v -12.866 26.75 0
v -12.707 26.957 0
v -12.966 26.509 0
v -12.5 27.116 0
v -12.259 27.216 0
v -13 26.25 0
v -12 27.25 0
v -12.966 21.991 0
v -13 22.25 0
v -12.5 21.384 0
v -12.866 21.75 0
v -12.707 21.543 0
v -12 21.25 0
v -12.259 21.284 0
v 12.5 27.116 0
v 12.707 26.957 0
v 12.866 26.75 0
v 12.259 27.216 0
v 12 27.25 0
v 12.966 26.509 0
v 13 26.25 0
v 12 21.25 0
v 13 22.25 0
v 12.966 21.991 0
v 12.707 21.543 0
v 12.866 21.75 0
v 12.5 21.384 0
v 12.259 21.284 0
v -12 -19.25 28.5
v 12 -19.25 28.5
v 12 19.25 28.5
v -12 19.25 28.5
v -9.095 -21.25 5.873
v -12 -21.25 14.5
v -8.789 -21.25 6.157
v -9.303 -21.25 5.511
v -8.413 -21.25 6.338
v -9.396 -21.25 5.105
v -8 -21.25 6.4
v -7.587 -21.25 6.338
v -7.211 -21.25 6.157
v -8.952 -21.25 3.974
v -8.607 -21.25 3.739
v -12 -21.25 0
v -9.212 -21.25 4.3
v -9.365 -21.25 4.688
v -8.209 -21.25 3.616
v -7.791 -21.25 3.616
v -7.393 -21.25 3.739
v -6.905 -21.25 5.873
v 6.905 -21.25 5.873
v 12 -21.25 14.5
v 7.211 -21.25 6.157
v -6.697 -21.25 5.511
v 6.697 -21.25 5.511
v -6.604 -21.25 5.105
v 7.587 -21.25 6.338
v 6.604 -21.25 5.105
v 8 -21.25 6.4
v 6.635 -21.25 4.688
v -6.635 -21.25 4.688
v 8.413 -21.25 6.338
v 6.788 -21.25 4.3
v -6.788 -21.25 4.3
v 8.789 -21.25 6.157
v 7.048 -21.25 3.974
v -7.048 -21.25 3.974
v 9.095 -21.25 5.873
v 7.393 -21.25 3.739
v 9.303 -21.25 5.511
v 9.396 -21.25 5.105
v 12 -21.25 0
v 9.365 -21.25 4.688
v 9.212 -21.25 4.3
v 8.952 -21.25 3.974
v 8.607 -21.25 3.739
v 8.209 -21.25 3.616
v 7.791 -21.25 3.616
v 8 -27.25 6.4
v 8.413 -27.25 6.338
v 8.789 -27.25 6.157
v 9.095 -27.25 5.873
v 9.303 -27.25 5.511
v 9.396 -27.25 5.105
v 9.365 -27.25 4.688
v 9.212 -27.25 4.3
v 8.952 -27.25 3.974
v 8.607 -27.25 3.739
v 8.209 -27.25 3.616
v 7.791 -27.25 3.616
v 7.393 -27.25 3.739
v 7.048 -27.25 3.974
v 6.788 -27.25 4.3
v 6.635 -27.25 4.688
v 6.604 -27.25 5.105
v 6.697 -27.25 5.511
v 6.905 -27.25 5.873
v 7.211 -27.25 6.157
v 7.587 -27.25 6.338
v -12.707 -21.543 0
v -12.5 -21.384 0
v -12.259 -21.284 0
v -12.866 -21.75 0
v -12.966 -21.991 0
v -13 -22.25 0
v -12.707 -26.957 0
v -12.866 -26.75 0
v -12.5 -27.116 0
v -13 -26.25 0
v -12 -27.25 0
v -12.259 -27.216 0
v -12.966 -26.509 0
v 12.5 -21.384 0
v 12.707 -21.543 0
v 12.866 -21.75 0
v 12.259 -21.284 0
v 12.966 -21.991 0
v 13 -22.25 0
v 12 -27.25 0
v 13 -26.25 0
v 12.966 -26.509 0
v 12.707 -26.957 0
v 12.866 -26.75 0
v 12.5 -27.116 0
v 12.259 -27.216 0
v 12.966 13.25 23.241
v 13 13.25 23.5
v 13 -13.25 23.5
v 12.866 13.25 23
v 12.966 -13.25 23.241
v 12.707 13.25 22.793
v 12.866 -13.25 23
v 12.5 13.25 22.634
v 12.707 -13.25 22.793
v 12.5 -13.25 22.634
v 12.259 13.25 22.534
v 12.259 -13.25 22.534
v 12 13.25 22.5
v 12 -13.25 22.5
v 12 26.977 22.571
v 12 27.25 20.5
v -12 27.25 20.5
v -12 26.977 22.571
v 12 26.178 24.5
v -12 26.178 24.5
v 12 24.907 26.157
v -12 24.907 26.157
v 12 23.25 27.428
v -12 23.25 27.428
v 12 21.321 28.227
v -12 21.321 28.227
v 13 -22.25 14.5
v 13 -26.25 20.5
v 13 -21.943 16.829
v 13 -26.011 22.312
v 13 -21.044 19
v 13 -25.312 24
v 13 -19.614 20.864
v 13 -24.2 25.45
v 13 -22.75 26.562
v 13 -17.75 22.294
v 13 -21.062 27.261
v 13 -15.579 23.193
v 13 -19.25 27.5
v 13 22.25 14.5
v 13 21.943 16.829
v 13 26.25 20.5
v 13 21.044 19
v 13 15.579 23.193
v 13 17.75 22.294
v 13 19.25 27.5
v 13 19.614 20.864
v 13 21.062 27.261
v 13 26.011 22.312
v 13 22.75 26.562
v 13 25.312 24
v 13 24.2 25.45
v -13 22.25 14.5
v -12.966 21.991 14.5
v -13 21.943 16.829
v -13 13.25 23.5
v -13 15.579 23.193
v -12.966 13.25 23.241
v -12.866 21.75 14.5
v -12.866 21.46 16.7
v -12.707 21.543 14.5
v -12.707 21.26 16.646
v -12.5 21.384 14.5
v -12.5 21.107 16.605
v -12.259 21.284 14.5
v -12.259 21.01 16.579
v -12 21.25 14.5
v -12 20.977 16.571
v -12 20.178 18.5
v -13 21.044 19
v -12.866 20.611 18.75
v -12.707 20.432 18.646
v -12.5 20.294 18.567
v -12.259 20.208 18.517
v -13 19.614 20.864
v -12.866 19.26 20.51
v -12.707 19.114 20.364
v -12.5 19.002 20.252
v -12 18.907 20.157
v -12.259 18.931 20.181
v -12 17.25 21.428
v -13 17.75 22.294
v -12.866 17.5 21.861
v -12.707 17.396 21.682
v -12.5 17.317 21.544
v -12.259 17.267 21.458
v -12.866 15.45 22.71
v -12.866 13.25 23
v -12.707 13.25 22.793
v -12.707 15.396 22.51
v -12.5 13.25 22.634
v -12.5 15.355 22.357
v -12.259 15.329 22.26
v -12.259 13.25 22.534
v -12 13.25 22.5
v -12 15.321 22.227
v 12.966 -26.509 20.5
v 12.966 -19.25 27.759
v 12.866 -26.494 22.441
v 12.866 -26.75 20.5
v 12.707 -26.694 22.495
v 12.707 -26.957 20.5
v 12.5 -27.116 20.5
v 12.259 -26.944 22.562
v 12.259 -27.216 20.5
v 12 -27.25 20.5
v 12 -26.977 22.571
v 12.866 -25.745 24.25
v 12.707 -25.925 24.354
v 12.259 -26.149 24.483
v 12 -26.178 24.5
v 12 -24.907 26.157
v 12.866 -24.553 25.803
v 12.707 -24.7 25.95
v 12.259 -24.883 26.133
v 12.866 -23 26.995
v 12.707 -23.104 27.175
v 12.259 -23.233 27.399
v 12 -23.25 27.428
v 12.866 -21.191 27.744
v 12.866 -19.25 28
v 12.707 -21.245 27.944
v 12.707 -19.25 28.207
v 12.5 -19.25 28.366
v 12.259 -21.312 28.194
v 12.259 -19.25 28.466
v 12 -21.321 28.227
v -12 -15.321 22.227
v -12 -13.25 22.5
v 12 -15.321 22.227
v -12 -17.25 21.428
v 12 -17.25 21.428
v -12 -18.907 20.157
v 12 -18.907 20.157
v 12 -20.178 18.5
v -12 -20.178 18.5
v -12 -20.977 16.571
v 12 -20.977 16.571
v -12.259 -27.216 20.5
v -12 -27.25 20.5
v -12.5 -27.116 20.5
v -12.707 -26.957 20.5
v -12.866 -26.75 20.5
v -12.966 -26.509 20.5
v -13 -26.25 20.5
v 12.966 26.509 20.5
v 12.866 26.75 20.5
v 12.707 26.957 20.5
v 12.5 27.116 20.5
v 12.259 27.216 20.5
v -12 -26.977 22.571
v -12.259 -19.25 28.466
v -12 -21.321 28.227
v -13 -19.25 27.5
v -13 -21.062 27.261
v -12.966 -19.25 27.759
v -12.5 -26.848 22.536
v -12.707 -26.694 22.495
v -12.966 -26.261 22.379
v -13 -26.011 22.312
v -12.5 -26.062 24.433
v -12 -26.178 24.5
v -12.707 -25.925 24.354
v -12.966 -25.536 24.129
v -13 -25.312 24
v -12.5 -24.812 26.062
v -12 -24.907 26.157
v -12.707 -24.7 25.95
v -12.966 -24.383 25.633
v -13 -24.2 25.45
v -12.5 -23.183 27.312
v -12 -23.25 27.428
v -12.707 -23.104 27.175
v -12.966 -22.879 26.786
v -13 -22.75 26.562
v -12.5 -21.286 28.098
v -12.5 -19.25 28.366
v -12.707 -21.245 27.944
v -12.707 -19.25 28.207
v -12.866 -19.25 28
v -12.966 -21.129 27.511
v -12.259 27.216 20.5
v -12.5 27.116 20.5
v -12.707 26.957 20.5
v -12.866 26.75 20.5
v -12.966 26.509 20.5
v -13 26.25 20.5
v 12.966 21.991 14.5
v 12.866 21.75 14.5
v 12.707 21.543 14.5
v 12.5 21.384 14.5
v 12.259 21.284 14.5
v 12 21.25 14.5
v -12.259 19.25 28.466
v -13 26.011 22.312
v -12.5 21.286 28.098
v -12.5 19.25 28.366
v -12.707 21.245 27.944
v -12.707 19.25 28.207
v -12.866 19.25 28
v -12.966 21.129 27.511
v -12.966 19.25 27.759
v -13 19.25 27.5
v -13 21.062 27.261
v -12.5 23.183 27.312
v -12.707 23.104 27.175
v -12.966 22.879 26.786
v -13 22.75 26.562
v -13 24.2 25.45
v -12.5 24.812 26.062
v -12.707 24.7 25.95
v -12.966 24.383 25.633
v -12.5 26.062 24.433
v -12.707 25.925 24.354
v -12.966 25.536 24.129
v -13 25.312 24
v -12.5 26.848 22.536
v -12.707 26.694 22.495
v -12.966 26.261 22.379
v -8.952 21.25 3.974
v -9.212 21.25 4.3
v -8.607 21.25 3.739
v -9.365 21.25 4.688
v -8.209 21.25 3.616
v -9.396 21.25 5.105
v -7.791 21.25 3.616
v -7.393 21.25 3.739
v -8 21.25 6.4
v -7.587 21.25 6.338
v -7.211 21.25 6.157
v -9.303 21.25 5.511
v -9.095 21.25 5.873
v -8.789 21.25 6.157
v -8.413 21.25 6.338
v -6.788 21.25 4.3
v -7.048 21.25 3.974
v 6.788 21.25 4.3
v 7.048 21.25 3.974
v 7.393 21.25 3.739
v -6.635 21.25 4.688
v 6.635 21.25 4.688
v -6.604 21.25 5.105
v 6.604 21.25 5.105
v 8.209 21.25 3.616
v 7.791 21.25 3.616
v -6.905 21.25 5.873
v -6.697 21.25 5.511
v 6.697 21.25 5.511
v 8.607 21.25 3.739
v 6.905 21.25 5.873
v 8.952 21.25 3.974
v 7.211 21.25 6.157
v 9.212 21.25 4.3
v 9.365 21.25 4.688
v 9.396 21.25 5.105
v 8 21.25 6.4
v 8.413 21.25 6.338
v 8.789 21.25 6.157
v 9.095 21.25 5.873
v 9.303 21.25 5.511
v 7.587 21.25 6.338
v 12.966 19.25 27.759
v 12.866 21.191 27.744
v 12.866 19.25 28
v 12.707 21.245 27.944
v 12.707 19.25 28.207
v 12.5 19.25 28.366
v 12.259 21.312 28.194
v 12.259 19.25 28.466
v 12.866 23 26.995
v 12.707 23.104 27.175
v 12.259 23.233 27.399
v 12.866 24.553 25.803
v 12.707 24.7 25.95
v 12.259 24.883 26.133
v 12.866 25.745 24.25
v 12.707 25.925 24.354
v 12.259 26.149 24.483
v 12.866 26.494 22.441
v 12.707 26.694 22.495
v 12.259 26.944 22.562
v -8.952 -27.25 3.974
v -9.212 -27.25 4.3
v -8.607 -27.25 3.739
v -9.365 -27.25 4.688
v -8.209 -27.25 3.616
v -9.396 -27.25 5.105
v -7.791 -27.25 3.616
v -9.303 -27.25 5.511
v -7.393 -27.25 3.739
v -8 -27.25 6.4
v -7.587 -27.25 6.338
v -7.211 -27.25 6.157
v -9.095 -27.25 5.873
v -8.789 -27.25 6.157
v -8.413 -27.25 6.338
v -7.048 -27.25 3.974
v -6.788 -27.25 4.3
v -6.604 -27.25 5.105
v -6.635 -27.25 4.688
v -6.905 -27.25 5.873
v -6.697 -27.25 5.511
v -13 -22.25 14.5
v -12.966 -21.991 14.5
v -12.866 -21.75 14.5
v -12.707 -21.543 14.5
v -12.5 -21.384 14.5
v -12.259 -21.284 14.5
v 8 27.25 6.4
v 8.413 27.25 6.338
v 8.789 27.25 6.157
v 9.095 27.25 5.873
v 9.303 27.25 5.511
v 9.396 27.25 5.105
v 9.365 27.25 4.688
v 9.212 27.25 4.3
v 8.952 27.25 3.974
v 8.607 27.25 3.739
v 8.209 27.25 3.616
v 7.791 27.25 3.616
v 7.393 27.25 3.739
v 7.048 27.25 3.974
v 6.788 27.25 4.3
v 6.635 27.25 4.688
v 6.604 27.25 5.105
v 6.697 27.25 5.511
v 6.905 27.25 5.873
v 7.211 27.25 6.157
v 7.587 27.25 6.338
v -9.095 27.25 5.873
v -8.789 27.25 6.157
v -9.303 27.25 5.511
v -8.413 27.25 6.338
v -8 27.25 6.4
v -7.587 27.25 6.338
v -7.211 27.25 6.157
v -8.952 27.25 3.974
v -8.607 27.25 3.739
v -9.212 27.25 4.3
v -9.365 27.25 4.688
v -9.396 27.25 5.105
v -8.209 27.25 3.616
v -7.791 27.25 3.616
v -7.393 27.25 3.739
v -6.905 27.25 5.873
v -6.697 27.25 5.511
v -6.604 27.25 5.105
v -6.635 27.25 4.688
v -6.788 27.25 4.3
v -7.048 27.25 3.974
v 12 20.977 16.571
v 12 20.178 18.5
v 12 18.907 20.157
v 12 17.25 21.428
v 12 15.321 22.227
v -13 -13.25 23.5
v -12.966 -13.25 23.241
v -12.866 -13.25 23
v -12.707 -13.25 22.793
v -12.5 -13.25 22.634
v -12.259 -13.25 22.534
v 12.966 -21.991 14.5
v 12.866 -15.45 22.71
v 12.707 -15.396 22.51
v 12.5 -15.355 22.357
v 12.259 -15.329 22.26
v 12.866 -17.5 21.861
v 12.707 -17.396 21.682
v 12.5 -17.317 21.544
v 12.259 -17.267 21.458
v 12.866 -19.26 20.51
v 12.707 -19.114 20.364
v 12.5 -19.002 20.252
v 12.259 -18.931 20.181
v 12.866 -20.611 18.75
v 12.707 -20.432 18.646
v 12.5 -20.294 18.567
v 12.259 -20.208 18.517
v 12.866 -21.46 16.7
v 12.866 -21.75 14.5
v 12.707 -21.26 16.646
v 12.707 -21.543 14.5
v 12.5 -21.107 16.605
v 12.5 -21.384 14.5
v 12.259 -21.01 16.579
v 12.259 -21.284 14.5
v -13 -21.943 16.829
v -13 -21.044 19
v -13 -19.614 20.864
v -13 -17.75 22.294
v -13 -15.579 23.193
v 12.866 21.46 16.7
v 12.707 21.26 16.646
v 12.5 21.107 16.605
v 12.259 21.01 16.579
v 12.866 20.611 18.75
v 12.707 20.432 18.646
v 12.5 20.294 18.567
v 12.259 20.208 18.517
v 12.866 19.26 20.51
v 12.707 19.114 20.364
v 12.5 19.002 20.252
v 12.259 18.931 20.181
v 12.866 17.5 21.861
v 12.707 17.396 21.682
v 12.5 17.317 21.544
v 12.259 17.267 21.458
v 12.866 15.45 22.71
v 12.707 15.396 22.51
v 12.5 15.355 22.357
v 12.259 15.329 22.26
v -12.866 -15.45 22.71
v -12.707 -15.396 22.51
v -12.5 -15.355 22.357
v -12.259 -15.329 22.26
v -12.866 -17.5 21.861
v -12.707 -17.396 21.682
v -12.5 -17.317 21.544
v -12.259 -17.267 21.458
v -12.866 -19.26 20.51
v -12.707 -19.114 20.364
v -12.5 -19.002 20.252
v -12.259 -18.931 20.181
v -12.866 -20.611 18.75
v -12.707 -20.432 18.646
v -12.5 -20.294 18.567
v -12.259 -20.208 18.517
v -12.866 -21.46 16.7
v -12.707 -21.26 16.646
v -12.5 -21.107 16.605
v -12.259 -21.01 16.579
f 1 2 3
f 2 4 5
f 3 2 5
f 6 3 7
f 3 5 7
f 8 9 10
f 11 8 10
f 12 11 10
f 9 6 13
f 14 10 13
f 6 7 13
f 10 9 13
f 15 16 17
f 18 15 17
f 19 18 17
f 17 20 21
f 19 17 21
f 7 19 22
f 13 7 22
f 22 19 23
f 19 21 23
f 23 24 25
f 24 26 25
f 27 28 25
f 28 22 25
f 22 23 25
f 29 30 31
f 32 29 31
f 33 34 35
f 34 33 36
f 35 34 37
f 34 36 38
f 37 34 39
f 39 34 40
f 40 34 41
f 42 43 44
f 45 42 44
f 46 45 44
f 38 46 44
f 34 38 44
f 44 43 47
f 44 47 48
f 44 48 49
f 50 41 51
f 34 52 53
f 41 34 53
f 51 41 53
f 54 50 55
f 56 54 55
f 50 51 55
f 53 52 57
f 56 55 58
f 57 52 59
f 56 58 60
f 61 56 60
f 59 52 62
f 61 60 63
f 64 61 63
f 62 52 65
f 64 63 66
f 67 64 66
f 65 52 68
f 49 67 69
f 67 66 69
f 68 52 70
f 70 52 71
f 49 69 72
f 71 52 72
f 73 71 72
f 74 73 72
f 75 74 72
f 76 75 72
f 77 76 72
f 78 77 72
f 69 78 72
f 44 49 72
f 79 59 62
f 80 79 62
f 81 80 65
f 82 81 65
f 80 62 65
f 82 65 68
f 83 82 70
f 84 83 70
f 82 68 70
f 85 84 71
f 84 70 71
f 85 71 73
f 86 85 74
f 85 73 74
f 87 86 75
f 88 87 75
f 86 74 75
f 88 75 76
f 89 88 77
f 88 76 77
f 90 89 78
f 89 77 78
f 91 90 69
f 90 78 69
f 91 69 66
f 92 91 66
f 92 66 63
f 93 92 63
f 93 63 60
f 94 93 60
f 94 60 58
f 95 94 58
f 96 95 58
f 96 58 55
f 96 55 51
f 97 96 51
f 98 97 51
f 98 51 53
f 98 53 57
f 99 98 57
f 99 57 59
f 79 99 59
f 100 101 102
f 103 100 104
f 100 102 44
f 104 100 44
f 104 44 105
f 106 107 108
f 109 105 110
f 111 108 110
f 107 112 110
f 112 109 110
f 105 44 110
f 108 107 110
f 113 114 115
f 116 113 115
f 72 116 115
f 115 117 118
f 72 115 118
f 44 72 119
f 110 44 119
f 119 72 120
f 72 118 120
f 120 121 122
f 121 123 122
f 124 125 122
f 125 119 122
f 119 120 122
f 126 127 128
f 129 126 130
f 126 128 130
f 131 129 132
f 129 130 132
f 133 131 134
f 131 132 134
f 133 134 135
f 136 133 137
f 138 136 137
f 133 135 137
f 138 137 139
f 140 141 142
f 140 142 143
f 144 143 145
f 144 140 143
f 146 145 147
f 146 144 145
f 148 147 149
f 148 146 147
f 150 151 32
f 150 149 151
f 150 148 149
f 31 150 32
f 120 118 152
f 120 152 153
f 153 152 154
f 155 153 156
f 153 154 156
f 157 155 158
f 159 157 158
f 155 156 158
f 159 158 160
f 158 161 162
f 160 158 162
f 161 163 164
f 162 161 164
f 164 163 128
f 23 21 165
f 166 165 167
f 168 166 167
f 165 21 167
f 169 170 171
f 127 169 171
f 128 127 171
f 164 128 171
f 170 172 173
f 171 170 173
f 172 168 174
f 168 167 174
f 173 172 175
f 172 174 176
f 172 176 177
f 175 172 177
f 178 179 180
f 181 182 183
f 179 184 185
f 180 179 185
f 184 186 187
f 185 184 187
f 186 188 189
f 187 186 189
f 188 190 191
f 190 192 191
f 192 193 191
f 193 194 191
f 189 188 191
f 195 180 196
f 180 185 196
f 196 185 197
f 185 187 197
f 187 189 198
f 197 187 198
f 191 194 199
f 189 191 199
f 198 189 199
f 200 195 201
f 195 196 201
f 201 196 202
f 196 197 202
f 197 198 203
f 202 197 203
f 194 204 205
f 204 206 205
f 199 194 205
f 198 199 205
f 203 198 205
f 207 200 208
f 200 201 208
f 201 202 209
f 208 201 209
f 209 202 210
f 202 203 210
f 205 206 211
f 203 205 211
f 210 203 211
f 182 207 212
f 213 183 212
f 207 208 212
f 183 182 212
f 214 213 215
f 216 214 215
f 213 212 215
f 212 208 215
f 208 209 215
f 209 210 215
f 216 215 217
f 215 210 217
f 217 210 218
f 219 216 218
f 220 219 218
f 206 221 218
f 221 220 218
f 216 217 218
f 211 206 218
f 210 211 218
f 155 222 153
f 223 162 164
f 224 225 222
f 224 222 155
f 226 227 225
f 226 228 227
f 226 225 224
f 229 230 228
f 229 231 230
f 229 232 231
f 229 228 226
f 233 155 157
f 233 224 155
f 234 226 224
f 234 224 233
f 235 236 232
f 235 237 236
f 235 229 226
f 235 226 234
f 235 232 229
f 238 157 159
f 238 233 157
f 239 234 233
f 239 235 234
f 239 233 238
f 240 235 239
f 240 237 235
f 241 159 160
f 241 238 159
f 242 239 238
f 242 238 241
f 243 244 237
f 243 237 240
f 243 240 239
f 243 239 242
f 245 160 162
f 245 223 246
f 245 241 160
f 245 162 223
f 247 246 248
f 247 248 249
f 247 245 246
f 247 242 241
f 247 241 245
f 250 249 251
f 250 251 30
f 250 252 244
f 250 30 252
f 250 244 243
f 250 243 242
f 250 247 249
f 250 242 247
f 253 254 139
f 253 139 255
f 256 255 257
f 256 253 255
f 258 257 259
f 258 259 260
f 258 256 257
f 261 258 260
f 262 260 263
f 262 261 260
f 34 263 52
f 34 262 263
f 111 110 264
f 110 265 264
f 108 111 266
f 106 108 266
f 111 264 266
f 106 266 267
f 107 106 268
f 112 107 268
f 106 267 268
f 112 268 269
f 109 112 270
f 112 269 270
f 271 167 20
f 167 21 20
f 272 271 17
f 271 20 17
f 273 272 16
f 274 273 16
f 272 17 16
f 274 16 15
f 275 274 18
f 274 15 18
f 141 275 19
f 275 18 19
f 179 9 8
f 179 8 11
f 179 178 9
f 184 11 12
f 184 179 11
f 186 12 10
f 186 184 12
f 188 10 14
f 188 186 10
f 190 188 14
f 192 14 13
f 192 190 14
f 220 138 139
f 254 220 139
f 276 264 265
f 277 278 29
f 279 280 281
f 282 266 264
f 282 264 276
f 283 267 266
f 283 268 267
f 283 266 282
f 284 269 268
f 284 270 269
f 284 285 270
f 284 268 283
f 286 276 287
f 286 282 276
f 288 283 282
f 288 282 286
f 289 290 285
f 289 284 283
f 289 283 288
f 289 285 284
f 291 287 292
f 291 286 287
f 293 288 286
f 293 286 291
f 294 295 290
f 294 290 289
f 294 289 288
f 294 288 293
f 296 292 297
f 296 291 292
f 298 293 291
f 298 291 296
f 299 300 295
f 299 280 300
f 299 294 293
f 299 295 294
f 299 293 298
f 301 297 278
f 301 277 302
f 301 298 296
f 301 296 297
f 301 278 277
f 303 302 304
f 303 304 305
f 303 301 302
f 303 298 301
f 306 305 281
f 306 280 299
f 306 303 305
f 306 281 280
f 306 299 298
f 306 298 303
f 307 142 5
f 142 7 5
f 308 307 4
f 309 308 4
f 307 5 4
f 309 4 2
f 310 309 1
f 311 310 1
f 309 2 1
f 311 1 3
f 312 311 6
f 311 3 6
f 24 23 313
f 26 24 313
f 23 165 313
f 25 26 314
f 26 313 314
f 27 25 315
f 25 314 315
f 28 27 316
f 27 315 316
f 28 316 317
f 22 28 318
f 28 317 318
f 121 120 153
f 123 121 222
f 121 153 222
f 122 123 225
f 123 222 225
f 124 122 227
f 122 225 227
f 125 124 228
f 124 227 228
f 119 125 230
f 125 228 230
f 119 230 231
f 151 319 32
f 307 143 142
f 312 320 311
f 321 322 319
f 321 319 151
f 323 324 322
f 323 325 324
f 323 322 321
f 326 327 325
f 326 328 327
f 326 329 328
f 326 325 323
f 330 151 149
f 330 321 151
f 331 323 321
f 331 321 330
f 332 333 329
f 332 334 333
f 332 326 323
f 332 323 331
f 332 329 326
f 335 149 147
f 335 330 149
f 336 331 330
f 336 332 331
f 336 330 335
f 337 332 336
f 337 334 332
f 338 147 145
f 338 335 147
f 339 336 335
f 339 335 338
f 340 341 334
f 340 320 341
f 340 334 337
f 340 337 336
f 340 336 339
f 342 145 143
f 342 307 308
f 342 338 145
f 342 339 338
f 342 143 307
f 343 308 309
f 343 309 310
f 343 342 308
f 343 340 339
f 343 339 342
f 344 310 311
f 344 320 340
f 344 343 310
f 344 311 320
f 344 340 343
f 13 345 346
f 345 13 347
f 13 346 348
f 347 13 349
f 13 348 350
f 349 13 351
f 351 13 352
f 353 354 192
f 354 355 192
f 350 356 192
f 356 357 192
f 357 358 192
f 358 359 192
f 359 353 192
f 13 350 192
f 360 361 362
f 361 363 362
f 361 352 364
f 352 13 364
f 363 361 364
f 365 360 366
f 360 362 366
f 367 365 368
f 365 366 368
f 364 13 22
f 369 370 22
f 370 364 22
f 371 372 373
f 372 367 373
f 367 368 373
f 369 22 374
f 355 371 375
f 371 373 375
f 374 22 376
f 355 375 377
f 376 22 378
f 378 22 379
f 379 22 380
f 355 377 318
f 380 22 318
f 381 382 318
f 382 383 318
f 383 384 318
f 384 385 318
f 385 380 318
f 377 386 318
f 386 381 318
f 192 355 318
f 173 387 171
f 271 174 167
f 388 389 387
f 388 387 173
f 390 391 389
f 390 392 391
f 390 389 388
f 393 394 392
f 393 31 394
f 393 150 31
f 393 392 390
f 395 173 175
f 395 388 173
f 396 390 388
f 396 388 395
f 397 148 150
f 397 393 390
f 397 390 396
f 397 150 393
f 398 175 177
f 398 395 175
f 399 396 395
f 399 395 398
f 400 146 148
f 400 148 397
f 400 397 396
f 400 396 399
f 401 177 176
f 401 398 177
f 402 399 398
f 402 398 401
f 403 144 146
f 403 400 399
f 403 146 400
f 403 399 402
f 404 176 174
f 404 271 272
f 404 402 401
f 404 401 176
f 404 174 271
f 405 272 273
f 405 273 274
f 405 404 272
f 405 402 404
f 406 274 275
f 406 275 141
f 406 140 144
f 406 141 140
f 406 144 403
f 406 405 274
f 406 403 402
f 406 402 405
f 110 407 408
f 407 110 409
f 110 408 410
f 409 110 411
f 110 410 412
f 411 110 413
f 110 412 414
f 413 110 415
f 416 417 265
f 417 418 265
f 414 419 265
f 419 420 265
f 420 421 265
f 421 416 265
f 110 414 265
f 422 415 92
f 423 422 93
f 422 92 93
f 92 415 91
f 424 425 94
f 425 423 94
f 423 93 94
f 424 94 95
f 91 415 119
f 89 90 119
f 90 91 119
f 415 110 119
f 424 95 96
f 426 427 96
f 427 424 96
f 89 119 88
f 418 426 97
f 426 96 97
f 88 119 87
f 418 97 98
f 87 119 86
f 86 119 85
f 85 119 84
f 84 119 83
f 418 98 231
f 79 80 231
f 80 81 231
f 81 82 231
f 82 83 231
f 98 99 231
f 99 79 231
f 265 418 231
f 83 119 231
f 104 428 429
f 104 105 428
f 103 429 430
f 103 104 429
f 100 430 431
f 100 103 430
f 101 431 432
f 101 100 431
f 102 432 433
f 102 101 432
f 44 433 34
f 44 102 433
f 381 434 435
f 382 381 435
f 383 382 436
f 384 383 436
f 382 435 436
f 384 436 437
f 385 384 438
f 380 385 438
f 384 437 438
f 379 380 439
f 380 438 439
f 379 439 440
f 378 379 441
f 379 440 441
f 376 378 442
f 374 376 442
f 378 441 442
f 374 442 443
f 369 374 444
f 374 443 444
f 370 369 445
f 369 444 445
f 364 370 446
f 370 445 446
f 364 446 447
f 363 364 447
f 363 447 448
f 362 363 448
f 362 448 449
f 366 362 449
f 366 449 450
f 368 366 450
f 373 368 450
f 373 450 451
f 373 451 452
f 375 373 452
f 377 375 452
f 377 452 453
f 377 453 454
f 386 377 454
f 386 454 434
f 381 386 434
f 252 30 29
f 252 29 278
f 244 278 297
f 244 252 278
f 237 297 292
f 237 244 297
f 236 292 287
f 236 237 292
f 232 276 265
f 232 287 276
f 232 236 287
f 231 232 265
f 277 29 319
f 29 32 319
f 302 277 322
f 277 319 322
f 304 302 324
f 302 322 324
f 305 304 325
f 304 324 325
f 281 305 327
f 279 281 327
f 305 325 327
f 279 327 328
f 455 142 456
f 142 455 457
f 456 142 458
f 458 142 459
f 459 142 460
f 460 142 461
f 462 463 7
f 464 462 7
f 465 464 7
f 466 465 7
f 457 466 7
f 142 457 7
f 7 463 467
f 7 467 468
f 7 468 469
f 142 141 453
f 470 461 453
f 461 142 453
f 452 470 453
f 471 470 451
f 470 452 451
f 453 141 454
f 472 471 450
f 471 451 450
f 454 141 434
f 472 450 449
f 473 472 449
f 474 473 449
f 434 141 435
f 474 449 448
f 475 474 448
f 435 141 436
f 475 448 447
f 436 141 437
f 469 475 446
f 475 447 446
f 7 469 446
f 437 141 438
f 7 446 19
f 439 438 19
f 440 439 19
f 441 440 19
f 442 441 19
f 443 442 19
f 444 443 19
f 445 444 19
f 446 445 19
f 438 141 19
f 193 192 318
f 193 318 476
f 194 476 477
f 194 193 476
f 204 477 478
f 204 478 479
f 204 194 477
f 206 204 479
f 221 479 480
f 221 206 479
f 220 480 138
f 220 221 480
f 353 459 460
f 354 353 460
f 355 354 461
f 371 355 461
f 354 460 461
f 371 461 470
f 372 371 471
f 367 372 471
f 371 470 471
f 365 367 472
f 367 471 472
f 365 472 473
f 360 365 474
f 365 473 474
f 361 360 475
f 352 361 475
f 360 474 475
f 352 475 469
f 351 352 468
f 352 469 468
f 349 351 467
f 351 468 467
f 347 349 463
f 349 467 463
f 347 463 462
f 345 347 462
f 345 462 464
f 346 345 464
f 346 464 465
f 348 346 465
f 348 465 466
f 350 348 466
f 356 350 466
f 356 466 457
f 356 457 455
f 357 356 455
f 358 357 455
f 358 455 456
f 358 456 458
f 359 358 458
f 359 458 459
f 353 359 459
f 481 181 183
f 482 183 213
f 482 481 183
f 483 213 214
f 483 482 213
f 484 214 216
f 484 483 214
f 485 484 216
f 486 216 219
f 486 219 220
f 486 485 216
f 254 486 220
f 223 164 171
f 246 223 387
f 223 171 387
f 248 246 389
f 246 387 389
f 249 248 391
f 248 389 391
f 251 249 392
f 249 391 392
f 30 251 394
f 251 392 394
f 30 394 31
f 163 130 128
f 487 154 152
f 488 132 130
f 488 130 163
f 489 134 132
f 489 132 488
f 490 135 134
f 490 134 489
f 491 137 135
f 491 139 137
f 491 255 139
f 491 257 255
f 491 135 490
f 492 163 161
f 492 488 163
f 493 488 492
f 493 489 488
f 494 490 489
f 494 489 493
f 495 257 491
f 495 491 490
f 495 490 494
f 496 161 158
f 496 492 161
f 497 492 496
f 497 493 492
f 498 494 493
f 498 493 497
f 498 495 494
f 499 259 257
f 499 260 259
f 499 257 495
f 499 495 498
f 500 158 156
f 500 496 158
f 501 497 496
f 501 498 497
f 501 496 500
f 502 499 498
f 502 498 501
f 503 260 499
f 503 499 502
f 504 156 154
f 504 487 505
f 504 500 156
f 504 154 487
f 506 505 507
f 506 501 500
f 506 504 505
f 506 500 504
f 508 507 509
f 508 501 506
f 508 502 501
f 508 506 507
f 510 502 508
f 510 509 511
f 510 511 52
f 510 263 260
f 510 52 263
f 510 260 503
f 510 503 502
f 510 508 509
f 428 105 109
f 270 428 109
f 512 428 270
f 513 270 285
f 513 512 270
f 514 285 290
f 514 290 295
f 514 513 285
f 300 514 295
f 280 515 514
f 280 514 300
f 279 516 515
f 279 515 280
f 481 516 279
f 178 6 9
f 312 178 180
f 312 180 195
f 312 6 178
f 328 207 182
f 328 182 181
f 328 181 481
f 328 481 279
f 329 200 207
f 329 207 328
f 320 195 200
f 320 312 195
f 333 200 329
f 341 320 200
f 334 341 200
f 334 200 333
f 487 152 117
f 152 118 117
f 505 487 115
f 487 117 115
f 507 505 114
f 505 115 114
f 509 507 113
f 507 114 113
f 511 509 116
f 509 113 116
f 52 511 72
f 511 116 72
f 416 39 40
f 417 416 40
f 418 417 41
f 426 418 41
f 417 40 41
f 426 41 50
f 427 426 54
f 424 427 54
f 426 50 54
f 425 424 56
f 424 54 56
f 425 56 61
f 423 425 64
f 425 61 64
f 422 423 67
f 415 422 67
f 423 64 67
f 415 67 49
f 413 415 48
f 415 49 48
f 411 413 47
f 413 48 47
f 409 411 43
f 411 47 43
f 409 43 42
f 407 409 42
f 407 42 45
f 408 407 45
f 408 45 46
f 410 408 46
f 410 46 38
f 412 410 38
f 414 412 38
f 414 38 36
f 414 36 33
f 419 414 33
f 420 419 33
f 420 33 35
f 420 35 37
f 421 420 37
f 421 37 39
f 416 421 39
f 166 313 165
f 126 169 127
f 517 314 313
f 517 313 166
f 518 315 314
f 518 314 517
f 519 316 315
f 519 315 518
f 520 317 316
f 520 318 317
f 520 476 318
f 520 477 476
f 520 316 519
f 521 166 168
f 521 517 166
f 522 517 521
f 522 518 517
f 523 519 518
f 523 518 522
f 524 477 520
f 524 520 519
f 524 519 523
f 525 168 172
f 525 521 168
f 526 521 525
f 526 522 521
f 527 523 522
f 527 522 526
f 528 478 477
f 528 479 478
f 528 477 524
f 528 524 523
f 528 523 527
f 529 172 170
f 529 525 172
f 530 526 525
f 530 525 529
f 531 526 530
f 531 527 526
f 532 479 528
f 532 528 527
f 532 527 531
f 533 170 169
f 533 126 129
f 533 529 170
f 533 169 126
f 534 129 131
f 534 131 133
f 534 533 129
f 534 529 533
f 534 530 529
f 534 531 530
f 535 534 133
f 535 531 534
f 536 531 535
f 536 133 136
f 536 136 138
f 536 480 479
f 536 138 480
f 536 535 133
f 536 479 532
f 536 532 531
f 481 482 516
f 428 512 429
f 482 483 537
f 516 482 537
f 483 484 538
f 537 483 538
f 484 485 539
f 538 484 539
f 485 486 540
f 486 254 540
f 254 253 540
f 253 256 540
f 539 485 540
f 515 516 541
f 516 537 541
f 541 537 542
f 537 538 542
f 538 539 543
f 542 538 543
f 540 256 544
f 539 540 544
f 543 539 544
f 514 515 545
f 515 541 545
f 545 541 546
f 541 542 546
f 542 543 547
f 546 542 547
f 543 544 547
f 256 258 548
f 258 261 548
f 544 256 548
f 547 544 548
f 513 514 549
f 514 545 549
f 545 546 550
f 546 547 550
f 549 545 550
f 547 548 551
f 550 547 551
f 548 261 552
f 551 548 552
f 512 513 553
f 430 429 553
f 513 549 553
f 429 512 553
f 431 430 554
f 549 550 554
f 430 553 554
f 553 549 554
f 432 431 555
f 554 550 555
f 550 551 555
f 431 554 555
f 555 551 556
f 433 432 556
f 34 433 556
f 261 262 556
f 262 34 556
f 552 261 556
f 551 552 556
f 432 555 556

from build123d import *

# Parameters (mm, degrees)
BASE_DEPTH              = 13
SKETCH2_R               = 1.4
SCREW_HOLES_DEPTH       = 63.860957676
F_8MM_BRACKET_FILLETS_R = 8
F_1MM_EDGE_FILLETS_R    = 1


with BuildPart() as part:
    # Sketch1 → Base (new, symmetric)
    with BuildSketch(Plane(origin=(0, 0, 0), x_dir=(0, 0, -1), z_dir=(1, 0, 0))):
        Polygon((0, 27.25), (0, 21.25), (-22.5, 21.25), (-22.5, -21.25), (0, -21.25), (0, -27.25), (-28.5, -27.25), (-28.5, 27.25), align=None)
    extrude(amount=BASE_DEPTH, both=True)

    # Sketch2 → Screw Holes (cut, through all)
    with BuildSketch(Plane(origin=(0, 27.25, 0), x_dir=(1, 0, 0), z_dir=(0, 1, 0))):
        with Locations((-8, -5)):
            Circle(SKETCH2_R)
        with Locations((8, -5)):
            Circle(SKETCH2_R)
    extrude(amount=-SCREW_HOLES_DEPTH, mode=Mode.SUBTRACT)

    # 8mm Bracket Fillets
    f_8mm_bracket_fillets_edges = [part.edges().sort_by_distance(p)[0] for p in [
        (0, 21.25, 22.5),
        (0, 27.25, 28.5),
        (0, -27.25, 28.5),
        (0, -21.25, 22.5),
    ]]
    fillet(f_8mm_bracket_fillets_edges, radius=F_8MM_BRACKET_FILLETS_R)

    # 1mm Edge Fillets
    f_1mm_edge_fillets_edges = [part.edges().sort_by_distance(p)[0] for p in [
        (13, -21.25, 7.25),
        (13, 21.25, 7.25),
        (13, 18.906854249, 20.156854249),
        (13, 0, 22.5),
        (-13, -21.25, 7.25),
        (-13, -18.906854249, 20.156854249),
        (-13, 21.25, 7.25),
        (-13, 18.906854249, 20.156854249),
        (-13, 27.25, 10.25),
        (-13, 24.906854249, 26.156854249),
        (-13, -27.25, 10.25),
        (-13, -24.906854249, 26.156854249),
        (13, 27.25, 10.25),
        (13, 24.906854249, 26.156854249),
        (13, -27.25, 10.25),
        (13, -24.906854249, 26.156854249),
        (13, -18.906854249, 20.156854249),
        (-13, 0, 22.5),
        (-13, 0, 28.5),
        (13, 0, 28.5),
    ]]
    fillet(f_1mm_edge_fillets_edges, radius=F_1MM_EDGE_FILLETS_R)


solid = part.part
